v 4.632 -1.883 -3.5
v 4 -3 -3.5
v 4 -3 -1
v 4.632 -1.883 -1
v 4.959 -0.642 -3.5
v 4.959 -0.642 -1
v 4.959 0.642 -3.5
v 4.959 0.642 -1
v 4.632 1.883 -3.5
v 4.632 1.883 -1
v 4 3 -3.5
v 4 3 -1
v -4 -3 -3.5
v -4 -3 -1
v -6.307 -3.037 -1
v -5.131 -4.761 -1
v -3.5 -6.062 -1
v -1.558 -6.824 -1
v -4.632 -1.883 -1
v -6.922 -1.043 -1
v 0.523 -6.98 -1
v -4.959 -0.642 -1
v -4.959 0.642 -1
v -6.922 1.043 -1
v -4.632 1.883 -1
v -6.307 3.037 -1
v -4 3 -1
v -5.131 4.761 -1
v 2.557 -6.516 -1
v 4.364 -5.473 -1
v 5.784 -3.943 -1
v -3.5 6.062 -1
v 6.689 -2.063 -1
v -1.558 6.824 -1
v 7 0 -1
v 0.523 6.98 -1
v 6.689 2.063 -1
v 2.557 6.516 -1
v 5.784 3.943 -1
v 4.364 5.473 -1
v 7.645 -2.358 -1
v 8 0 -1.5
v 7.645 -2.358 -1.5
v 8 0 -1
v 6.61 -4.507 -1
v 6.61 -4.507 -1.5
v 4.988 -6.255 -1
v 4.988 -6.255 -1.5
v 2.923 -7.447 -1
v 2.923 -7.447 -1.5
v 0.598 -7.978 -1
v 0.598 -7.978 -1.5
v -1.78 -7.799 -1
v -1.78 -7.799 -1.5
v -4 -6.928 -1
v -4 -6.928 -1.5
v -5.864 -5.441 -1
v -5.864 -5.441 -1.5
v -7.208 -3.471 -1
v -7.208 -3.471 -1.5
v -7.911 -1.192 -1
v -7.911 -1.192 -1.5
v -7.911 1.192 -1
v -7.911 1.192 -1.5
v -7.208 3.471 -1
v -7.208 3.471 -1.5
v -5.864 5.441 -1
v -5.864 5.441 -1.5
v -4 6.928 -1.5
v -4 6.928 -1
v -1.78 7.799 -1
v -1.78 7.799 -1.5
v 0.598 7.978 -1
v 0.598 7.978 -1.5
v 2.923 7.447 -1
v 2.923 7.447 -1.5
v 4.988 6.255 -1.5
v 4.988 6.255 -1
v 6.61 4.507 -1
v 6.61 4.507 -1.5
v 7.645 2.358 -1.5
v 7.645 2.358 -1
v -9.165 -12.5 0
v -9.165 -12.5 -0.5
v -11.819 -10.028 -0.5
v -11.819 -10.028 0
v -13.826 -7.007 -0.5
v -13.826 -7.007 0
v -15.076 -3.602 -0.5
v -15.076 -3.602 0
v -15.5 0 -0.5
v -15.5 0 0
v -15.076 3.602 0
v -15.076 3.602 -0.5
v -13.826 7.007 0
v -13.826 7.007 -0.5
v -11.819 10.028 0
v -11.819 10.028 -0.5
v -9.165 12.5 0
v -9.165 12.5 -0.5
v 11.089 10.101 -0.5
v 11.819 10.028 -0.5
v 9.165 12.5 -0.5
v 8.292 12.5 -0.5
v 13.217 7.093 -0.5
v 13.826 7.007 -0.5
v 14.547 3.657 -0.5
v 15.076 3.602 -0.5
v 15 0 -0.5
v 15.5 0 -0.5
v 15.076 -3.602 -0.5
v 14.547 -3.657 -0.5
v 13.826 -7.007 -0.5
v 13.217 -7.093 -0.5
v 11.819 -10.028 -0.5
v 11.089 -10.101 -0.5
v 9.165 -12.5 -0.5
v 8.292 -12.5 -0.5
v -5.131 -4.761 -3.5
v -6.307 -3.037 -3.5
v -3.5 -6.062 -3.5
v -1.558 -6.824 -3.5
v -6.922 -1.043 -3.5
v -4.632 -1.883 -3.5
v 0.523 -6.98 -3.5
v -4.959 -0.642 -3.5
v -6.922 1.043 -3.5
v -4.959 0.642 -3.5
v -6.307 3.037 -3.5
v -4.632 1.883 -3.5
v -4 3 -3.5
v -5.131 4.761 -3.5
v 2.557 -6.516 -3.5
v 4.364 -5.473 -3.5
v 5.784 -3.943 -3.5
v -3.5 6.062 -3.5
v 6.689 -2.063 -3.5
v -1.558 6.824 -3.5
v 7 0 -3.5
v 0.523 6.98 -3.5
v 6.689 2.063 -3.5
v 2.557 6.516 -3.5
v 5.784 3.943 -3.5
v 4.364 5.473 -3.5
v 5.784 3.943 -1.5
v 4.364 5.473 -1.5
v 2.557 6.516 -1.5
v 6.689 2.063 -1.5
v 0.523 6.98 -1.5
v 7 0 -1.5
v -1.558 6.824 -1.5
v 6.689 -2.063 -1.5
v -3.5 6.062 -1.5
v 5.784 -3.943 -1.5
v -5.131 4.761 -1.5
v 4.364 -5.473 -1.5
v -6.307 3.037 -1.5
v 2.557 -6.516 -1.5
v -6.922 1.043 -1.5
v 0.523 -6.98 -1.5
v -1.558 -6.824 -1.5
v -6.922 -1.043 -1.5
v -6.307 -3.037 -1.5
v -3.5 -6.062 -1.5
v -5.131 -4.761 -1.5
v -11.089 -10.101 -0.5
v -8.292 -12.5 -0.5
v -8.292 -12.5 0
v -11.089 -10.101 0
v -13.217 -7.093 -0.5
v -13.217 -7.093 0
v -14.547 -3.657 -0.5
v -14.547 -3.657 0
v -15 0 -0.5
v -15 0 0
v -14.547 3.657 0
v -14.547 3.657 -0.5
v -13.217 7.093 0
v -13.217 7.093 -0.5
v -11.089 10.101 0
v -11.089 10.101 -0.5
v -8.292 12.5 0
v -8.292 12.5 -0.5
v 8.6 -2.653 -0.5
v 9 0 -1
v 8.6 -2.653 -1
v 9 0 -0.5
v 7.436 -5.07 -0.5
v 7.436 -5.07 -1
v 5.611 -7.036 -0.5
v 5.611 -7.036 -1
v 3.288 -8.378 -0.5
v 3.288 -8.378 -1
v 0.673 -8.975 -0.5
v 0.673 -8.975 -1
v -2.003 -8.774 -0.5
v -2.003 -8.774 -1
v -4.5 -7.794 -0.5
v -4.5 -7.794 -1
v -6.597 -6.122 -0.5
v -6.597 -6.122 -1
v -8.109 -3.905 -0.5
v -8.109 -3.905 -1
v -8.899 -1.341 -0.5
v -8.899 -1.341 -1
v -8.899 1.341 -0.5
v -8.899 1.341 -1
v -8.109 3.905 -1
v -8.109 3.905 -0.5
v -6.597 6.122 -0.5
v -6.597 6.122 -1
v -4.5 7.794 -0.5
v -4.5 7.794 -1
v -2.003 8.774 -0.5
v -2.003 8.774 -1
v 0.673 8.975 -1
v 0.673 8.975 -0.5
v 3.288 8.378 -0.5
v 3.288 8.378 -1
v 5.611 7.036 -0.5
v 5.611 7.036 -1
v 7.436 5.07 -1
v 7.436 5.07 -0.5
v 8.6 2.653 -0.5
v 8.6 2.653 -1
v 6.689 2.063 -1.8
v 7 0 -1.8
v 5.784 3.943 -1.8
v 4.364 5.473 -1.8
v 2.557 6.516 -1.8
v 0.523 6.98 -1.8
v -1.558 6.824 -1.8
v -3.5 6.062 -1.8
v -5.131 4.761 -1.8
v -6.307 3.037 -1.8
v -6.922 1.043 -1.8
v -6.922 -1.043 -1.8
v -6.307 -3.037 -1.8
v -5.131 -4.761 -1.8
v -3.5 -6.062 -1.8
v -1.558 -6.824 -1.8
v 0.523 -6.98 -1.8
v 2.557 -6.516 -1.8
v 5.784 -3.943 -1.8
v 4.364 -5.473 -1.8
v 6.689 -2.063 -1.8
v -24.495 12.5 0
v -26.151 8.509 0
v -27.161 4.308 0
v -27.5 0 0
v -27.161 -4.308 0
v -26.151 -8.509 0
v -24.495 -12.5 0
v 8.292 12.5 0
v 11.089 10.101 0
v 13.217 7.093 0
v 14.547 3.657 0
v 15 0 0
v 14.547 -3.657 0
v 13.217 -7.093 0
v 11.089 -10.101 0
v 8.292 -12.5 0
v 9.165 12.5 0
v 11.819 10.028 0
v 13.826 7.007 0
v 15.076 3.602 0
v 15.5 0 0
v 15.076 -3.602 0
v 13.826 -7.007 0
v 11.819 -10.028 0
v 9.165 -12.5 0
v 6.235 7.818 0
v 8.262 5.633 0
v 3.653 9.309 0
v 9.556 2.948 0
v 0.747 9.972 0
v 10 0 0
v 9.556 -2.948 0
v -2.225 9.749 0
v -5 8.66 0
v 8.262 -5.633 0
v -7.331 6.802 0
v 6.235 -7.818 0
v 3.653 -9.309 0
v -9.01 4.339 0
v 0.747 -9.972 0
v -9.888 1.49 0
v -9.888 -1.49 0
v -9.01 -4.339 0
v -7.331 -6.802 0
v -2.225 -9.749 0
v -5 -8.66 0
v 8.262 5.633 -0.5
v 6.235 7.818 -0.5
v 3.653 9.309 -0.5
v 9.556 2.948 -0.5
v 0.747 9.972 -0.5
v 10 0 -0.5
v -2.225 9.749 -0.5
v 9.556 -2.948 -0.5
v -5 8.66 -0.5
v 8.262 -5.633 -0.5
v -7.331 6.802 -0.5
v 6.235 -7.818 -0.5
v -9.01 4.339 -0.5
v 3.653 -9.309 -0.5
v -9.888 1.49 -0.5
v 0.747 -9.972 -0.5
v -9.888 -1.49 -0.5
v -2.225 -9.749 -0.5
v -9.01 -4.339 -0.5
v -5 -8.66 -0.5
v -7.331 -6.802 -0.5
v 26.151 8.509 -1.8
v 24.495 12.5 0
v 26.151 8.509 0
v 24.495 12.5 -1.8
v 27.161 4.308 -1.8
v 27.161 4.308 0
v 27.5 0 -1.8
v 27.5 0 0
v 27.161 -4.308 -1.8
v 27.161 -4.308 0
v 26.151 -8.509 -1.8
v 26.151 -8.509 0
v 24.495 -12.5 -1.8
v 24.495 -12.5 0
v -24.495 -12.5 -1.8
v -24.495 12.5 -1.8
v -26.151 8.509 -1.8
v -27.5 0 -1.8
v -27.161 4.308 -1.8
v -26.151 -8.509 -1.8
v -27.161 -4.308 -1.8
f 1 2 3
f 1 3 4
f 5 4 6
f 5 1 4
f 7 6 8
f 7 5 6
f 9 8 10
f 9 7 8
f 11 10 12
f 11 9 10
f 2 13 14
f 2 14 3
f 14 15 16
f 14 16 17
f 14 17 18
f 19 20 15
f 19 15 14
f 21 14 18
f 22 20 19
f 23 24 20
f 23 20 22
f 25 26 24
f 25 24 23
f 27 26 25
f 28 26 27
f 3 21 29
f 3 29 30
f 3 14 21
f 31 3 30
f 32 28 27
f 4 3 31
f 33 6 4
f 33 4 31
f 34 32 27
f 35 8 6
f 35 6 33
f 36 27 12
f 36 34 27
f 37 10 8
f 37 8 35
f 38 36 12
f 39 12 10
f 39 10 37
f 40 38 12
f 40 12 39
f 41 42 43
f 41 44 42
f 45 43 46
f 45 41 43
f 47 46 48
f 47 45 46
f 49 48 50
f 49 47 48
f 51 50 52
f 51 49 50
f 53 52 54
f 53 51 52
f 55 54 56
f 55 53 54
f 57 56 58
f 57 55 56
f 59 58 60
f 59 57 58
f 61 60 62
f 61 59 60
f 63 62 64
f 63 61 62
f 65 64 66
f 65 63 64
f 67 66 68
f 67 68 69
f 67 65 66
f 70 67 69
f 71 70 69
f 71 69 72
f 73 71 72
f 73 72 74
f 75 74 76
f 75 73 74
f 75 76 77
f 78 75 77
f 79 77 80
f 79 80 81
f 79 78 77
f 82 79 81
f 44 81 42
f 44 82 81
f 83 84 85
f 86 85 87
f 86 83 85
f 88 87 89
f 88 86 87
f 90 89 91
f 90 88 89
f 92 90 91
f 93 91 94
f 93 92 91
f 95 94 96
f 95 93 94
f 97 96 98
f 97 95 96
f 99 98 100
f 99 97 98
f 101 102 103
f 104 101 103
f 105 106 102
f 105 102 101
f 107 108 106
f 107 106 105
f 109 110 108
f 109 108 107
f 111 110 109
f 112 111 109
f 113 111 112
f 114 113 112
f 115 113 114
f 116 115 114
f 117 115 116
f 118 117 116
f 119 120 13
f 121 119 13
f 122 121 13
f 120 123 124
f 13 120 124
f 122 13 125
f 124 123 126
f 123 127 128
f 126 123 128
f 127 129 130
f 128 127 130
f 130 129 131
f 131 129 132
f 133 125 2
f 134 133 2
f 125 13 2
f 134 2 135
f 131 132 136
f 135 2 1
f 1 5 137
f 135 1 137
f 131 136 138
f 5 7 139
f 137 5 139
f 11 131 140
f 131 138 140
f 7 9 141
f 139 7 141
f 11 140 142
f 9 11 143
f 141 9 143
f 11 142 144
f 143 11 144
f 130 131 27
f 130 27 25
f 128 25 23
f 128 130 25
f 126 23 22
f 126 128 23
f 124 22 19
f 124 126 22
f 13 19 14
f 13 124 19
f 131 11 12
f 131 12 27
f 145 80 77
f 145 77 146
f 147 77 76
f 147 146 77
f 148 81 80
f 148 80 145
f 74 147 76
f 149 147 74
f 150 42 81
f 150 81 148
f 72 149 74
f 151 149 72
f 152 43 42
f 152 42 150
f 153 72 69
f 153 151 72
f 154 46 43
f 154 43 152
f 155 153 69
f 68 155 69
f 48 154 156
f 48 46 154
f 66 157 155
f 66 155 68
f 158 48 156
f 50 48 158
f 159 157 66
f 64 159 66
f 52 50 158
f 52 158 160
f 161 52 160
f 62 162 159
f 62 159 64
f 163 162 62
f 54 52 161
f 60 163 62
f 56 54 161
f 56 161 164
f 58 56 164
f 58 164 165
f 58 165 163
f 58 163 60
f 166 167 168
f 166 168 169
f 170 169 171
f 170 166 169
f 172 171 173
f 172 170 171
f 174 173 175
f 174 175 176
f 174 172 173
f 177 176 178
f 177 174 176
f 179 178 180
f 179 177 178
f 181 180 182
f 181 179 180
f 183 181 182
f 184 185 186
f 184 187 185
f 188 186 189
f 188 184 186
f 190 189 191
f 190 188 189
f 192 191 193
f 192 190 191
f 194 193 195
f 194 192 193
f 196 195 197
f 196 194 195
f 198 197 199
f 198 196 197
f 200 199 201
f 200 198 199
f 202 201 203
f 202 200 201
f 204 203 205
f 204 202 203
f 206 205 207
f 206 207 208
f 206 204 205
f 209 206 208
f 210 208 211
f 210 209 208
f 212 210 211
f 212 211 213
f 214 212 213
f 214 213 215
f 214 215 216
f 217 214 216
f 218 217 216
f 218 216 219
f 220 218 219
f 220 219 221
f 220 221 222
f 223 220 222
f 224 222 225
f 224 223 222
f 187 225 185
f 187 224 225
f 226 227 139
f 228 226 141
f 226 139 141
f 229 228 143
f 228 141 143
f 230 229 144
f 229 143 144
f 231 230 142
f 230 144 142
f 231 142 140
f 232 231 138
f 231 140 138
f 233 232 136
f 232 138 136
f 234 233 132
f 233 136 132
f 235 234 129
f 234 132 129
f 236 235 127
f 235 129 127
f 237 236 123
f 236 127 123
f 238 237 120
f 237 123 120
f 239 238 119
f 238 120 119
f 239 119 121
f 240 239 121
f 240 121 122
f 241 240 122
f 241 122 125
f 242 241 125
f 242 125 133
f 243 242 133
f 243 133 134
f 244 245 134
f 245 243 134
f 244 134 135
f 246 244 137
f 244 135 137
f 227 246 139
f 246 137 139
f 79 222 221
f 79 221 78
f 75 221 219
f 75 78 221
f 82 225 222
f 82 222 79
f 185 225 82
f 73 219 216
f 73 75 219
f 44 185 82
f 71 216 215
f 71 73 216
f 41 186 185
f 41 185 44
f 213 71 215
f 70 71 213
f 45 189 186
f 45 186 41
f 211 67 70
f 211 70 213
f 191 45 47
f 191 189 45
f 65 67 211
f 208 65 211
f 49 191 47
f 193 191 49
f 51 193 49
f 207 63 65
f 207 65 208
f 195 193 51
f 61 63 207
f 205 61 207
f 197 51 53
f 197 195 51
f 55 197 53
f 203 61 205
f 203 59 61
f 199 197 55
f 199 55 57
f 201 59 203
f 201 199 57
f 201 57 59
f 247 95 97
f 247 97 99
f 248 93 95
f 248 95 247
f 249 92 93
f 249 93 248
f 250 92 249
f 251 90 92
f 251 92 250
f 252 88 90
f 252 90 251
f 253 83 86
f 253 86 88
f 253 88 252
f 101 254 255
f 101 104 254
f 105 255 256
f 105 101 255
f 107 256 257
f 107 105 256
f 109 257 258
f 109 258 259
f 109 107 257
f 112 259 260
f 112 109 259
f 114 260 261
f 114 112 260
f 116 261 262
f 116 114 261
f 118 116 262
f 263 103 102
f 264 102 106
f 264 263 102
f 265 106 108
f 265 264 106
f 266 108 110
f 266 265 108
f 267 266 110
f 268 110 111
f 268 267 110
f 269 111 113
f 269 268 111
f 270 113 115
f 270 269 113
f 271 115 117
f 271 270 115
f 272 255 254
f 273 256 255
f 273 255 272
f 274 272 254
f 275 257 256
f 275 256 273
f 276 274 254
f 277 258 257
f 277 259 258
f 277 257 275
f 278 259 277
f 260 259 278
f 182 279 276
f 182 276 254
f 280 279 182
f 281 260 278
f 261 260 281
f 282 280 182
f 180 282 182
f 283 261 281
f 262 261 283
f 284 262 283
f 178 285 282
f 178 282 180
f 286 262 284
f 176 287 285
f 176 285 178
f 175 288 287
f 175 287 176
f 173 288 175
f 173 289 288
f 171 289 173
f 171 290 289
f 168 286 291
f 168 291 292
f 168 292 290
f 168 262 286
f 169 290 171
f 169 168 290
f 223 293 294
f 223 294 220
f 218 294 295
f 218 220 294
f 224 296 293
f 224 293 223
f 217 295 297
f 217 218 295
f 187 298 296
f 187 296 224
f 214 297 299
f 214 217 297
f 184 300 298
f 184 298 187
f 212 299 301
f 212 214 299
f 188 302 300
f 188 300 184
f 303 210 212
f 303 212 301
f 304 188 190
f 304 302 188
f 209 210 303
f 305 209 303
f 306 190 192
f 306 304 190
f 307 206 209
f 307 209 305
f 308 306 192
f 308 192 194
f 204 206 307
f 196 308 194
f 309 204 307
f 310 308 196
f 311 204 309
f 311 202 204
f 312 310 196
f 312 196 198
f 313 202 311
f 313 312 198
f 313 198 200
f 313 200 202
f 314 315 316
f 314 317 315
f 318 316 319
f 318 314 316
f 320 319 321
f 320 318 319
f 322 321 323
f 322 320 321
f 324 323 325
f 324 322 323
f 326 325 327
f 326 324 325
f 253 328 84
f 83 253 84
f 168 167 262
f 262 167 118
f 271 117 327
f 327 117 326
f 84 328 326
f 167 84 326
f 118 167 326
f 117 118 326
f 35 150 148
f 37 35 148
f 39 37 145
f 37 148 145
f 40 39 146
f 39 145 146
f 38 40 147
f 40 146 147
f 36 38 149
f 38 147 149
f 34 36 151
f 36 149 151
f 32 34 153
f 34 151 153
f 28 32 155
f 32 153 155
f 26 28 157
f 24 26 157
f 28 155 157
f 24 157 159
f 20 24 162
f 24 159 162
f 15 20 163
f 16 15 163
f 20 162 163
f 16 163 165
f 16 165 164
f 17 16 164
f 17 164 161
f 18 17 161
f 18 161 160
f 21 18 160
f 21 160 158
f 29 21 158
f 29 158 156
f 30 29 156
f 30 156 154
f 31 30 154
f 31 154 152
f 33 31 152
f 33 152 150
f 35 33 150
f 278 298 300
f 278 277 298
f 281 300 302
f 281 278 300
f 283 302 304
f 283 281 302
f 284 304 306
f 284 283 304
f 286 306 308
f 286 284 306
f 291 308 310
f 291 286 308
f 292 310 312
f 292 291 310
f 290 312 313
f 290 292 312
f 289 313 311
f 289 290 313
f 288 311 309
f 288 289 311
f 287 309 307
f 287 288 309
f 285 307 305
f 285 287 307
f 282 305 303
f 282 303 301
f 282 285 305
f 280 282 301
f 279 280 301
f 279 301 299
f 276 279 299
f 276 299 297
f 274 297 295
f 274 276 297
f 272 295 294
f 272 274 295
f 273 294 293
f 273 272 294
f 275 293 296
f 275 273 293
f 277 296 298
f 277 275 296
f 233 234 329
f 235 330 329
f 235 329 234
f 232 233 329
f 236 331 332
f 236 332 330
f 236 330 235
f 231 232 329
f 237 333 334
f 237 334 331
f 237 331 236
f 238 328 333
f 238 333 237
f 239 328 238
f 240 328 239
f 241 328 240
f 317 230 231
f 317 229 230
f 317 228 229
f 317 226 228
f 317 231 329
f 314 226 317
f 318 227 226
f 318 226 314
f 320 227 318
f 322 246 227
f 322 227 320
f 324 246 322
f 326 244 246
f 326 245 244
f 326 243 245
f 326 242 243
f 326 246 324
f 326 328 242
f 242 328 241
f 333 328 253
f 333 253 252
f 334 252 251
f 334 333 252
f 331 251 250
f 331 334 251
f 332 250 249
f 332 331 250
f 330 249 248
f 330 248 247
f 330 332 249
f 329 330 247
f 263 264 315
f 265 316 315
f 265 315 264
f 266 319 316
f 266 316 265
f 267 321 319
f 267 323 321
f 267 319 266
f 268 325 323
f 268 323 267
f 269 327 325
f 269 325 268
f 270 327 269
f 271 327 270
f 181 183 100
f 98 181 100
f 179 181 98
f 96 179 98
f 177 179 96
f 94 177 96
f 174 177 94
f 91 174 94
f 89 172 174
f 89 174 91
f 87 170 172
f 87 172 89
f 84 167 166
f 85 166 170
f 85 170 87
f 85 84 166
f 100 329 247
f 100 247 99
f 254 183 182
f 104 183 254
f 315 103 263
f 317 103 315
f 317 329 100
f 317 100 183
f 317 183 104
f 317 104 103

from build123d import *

# Parameters (mm, degrees)
CUT_EXTRUDE_START    = -1.8
CUT_EXTRUDE_1_DEPTH  = 1.8
EXTRUDE_1_DEPTH      = 0.5
EXTRUDE_1_DEPTH_BACK = 2
SKETCH_3_R           = 7


with BuildPart() as part:
    # Эскиз1 → Повернуть1 (revolve)
    with BuildSketch(Plane(origin=(0, 0, 0), x_dir=(0, 0, -1), z_dir=(1, 0, 0)), mode=Mode.PRIVATE) as revolve_1_sk:
        Polygon((1.5, 7), (1.5, 8), (1, 8), (1, 9), (0.5, 9), (0.5, 10), (0, 10), (0, 15), (0.5, 15), (0.5, 15.5), (0, 15.5), (0, 27.5), (1.8, 27.5), (1.8, 7), align=None)
    revolve(revolve_1_sk.sketch.rotate(Axis((0, 0, 1.483516484), (0, 0, -1)), 90), axis=Axis((0, 0, 1.483516484), (0, 0, -1)))

    # Эскиз2 → Вырез-Вытянуть1 (cut)
    with BuildSketch(Plane.XY.offset(CUT_EXTRUDE_START)):
        with BuildLine():
            Line((-24.494897428, 12.5), (24.494897428, 12.5))
            ThreePointArc((24.494897428, 12.5), (0, 27.5), (-24.494897428, 12.5))
        make_face()
        with BuildLine():
            Line((-24.494897428, -12.5), (24.494897428, -12.5))
            ThreePointArc((24.494897428, -12.5), (0, -27.5), (-24.494897428, -12.5))
        make_face()
    extrude(amount=CUT_EXTRUDE_1_DEPTH, mode=Mode.SUBTRACT)

    # Эскиз3 → Бобышка-Вытянуть1 (add, two sides: drawn at the far end of the back side and taken through both)
    with BuildSketch(Plane.XY.offset(-1.5).offset(-EXTRUDE_1_DEPTH_BACK)):
        Circle(SKETCH_3_R)
        with BuildLine():
            Line((4, 3), (-4, 3))
            ThreePointArc((-4, 3), (-5, 0), (-4, -3))
            Line((-4, -3), (4, -3))
            ThreePointArc((4, -3), (5, 0), (4, 3))
        make_face(mode=Mode.SUBTRACT)
    extrude(amount=EXTRUDE_1_DEPTH + EXTRUDE_1_DEPTH_BACK)


solid = part.part
